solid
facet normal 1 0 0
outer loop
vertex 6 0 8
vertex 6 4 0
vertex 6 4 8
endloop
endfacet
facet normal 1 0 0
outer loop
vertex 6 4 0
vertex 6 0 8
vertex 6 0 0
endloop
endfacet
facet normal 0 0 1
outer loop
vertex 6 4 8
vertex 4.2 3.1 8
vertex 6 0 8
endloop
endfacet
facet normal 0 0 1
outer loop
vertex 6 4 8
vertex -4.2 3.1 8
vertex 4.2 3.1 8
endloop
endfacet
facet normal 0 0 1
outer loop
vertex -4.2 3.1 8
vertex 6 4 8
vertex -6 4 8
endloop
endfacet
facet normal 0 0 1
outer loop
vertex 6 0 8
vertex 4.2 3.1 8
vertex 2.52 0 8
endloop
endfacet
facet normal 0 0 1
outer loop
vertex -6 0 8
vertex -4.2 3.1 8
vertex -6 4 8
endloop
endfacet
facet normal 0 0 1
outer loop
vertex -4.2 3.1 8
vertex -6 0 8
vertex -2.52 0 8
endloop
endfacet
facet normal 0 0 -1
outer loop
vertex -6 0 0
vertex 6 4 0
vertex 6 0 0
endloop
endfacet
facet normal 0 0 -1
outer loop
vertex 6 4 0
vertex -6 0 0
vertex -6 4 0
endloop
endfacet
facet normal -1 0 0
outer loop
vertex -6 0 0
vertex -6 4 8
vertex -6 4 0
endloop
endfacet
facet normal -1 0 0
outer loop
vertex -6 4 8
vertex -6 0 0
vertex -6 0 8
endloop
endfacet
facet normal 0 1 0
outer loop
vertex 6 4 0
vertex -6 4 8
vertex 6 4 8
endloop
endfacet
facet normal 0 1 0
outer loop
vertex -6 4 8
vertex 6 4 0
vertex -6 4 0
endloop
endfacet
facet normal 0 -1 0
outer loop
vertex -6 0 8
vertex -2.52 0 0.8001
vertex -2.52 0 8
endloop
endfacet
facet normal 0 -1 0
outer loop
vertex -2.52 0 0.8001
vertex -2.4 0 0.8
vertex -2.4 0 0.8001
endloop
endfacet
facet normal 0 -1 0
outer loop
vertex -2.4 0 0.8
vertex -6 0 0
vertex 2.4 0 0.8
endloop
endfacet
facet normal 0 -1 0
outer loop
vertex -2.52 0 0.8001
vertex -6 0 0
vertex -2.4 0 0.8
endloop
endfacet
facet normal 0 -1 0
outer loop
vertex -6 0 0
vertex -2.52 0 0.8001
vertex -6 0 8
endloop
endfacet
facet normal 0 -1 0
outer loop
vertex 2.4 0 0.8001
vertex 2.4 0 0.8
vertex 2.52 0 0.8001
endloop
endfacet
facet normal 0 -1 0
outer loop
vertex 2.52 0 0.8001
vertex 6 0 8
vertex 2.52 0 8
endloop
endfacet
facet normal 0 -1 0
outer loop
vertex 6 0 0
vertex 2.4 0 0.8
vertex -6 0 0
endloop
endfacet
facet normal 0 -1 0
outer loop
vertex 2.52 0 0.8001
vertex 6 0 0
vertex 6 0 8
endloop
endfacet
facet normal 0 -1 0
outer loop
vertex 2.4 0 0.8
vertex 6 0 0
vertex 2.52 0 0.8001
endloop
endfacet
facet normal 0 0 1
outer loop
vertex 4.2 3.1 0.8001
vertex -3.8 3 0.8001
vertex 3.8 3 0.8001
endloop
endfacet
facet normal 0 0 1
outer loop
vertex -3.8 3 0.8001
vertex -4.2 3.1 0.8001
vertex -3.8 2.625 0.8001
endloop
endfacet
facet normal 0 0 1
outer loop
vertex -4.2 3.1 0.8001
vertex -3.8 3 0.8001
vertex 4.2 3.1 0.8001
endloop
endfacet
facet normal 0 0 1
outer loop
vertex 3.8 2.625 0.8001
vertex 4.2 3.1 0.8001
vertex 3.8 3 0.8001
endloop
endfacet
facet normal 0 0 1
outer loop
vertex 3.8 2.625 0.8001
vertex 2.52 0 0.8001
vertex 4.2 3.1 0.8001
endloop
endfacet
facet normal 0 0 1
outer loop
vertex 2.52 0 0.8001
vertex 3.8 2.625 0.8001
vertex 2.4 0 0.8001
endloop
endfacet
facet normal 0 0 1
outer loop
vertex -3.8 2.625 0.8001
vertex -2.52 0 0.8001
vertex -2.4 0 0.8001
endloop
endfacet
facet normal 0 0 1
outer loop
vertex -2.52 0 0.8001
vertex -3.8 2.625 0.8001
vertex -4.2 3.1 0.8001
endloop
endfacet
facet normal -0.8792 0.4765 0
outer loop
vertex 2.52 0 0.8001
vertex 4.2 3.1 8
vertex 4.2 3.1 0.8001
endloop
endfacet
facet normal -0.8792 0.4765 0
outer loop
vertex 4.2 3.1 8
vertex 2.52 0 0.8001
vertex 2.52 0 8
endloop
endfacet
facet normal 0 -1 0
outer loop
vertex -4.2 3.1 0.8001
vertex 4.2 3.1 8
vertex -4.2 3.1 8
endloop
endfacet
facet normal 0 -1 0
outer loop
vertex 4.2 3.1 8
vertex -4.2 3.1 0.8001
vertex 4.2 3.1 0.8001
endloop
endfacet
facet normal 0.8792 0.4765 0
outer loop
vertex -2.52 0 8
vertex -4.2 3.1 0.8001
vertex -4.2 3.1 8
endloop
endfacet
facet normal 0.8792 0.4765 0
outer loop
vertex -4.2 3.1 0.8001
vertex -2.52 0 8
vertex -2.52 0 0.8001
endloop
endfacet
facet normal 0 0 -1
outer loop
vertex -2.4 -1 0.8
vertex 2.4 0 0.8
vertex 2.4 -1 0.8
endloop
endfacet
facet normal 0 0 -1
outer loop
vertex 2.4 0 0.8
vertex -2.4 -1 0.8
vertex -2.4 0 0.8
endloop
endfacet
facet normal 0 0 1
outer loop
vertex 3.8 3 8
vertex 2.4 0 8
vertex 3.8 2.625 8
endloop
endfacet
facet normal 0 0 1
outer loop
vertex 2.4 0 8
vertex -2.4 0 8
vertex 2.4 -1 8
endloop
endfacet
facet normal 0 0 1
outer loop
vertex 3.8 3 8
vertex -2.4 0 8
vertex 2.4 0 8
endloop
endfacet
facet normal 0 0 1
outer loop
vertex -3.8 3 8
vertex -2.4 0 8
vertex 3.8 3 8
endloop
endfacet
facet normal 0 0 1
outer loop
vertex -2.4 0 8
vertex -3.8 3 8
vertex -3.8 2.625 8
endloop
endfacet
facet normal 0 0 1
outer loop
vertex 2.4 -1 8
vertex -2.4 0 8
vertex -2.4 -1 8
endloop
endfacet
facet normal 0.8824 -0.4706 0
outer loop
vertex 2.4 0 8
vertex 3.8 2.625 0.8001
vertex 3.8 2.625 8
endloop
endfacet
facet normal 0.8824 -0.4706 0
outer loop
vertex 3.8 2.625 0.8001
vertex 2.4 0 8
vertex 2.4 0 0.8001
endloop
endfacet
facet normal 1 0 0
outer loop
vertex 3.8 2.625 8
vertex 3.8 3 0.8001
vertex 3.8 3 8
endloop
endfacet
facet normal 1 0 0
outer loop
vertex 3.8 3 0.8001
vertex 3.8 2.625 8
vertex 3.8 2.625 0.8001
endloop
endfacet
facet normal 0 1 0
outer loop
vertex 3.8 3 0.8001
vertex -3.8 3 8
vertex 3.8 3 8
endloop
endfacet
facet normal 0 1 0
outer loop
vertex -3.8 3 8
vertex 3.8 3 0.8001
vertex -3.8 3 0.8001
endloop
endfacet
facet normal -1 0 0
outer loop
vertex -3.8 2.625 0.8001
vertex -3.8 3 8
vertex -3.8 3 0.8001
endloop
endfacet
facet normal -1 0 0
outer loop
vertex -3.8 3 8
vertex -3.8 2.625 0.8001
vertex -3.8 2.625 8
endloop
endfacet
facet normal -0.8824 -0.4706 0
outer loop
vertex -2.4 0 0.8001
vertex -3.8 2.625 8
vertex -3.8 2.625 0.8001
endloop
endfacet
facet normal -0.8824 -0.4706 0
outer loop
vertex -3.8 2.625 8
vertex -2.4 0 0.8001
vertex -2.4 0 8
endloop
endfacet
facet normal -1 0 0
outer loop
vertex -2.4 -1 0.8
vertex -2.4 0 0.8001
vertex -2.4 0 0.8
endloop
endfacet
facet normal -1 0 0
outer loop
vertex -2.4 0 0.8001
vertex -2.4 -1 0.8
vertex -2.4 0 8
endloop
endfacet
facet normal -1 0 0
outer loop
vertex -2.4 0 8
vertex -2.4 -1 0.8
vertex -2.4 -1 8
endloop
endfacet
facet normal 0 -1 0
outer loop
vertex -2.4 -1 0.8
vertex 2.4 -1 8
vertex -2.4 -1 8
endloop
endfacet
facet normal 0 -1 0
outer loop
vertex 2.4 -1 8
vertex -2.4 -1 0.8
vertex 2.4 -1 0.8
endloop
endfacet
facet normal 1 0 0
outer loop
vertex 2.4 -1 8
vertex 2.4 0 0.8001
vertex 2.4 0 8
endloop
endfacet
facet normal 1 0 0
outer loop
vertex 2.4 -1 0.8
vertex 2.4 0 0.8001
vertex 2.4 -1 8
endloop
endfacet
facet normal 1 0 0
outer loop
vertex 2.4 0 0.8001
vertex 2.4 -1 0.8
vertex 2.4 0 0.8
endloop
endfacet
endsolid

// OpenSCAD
pinDepth = 3;
pinWidth = 8;
tailHeight = 8;

pinWidthFraction = 0.4;
pinHeightFraction = 0.9;

overhangDepth = 1;
overhangWidth = 2;

fitTolerance = 0.4;

cornerTrim = 0.4;

pinOrTail = "both"; // [pin,tail,both]


makeJoint();



module makeJoint()
{
    if( pinOrTail == "pin" )
    {
        DovetailPin( pinDepth, pinWidth, tailHeight, pinWidthFraction, pinHeightFraction, overhangDepth, cornerTrim );
    }
    else if( pinOrTail == "tail" )
    {
        DovetailTail( pinDepth, pinWidth, tailHeight, pinWidthFraction, pinHeightFraction, overhangDepth, overhangWidth, fitTolerance );
    }
    else
    {
        DovetailPin( pinDepth, pinWidth, tailHeight, pinWidthFraction, pinHeightFraction, overhangDepth, cornerTrim );

        DovetailTail( pinDepth, pinWidth, tailHeight, pinWidthFraction, pinHeightFraction, overhangDepth, overhangWidth, fitTolerance );
    }     
}



module DovetailPin( depth,
                    width,
                    height,
                    wedgeWidthFraction,
                    wedgeHeightFraction,
                    overhangDepth,
                    cornerTrim = 0 )
{
    rectangleWidth = width* (1-wedgeWidthFraction);

    //  Compute how much of the corners to trim off to improve fit
    
    angle = atan2((width - rectangleWidth)/2, depth );
    trimmedY = ((( width - rectangleWidth)/2) - cornerTrim ) / tan( angle );
    
    translate([0, depth/2, height*(1-wedgeHeightFraction)])   
    linear_extrude(height*wedgeHeightFraction)
    {
        polygon( points=[[-rectangleWidth/2,-depth/2],
                         [-rectangleWidth/2, -((depth/2) + overhangDepth)],
                         [rectangleWidth/2,  -((depth/2) + overhangDepth)],
                         [rectangleWidth/2,-depth/2],
                         [(width-cornerTrim)/2,trimmedY/2],
                         [(width-cornerTrim)/2,depth/2],
                         [-(width-cornerTrim)/2,depth/2],
                         [-(width-cornerTrim)/2,trimmedY/2]],
                 paths=[[0,1,2,3,4,5,6,7]]);    
    }
}



module DovetailTail( depth,
                     width,
                     height,
                     wedgeWidthFraction,
                     wedgeHeightFraction,
                     overhangDepth,
                     overhangWidth,
                     fitTolerance )
{
    difference()
    {
        translate([ 0, (depth+overhangDepth)/2, (height/2)])
        cube([width+(overhangWidth*2),depth+overhangDepth,height],true);
        
        scale([1+(fitTolerance/width),1+(fitTolerance/(4*depth)),1.0001])
        {
            DovetailPin( depth, width, height, wedgeWidthFraction, wedgeHeightFraction, overhangDepth );
        }
    }
}
